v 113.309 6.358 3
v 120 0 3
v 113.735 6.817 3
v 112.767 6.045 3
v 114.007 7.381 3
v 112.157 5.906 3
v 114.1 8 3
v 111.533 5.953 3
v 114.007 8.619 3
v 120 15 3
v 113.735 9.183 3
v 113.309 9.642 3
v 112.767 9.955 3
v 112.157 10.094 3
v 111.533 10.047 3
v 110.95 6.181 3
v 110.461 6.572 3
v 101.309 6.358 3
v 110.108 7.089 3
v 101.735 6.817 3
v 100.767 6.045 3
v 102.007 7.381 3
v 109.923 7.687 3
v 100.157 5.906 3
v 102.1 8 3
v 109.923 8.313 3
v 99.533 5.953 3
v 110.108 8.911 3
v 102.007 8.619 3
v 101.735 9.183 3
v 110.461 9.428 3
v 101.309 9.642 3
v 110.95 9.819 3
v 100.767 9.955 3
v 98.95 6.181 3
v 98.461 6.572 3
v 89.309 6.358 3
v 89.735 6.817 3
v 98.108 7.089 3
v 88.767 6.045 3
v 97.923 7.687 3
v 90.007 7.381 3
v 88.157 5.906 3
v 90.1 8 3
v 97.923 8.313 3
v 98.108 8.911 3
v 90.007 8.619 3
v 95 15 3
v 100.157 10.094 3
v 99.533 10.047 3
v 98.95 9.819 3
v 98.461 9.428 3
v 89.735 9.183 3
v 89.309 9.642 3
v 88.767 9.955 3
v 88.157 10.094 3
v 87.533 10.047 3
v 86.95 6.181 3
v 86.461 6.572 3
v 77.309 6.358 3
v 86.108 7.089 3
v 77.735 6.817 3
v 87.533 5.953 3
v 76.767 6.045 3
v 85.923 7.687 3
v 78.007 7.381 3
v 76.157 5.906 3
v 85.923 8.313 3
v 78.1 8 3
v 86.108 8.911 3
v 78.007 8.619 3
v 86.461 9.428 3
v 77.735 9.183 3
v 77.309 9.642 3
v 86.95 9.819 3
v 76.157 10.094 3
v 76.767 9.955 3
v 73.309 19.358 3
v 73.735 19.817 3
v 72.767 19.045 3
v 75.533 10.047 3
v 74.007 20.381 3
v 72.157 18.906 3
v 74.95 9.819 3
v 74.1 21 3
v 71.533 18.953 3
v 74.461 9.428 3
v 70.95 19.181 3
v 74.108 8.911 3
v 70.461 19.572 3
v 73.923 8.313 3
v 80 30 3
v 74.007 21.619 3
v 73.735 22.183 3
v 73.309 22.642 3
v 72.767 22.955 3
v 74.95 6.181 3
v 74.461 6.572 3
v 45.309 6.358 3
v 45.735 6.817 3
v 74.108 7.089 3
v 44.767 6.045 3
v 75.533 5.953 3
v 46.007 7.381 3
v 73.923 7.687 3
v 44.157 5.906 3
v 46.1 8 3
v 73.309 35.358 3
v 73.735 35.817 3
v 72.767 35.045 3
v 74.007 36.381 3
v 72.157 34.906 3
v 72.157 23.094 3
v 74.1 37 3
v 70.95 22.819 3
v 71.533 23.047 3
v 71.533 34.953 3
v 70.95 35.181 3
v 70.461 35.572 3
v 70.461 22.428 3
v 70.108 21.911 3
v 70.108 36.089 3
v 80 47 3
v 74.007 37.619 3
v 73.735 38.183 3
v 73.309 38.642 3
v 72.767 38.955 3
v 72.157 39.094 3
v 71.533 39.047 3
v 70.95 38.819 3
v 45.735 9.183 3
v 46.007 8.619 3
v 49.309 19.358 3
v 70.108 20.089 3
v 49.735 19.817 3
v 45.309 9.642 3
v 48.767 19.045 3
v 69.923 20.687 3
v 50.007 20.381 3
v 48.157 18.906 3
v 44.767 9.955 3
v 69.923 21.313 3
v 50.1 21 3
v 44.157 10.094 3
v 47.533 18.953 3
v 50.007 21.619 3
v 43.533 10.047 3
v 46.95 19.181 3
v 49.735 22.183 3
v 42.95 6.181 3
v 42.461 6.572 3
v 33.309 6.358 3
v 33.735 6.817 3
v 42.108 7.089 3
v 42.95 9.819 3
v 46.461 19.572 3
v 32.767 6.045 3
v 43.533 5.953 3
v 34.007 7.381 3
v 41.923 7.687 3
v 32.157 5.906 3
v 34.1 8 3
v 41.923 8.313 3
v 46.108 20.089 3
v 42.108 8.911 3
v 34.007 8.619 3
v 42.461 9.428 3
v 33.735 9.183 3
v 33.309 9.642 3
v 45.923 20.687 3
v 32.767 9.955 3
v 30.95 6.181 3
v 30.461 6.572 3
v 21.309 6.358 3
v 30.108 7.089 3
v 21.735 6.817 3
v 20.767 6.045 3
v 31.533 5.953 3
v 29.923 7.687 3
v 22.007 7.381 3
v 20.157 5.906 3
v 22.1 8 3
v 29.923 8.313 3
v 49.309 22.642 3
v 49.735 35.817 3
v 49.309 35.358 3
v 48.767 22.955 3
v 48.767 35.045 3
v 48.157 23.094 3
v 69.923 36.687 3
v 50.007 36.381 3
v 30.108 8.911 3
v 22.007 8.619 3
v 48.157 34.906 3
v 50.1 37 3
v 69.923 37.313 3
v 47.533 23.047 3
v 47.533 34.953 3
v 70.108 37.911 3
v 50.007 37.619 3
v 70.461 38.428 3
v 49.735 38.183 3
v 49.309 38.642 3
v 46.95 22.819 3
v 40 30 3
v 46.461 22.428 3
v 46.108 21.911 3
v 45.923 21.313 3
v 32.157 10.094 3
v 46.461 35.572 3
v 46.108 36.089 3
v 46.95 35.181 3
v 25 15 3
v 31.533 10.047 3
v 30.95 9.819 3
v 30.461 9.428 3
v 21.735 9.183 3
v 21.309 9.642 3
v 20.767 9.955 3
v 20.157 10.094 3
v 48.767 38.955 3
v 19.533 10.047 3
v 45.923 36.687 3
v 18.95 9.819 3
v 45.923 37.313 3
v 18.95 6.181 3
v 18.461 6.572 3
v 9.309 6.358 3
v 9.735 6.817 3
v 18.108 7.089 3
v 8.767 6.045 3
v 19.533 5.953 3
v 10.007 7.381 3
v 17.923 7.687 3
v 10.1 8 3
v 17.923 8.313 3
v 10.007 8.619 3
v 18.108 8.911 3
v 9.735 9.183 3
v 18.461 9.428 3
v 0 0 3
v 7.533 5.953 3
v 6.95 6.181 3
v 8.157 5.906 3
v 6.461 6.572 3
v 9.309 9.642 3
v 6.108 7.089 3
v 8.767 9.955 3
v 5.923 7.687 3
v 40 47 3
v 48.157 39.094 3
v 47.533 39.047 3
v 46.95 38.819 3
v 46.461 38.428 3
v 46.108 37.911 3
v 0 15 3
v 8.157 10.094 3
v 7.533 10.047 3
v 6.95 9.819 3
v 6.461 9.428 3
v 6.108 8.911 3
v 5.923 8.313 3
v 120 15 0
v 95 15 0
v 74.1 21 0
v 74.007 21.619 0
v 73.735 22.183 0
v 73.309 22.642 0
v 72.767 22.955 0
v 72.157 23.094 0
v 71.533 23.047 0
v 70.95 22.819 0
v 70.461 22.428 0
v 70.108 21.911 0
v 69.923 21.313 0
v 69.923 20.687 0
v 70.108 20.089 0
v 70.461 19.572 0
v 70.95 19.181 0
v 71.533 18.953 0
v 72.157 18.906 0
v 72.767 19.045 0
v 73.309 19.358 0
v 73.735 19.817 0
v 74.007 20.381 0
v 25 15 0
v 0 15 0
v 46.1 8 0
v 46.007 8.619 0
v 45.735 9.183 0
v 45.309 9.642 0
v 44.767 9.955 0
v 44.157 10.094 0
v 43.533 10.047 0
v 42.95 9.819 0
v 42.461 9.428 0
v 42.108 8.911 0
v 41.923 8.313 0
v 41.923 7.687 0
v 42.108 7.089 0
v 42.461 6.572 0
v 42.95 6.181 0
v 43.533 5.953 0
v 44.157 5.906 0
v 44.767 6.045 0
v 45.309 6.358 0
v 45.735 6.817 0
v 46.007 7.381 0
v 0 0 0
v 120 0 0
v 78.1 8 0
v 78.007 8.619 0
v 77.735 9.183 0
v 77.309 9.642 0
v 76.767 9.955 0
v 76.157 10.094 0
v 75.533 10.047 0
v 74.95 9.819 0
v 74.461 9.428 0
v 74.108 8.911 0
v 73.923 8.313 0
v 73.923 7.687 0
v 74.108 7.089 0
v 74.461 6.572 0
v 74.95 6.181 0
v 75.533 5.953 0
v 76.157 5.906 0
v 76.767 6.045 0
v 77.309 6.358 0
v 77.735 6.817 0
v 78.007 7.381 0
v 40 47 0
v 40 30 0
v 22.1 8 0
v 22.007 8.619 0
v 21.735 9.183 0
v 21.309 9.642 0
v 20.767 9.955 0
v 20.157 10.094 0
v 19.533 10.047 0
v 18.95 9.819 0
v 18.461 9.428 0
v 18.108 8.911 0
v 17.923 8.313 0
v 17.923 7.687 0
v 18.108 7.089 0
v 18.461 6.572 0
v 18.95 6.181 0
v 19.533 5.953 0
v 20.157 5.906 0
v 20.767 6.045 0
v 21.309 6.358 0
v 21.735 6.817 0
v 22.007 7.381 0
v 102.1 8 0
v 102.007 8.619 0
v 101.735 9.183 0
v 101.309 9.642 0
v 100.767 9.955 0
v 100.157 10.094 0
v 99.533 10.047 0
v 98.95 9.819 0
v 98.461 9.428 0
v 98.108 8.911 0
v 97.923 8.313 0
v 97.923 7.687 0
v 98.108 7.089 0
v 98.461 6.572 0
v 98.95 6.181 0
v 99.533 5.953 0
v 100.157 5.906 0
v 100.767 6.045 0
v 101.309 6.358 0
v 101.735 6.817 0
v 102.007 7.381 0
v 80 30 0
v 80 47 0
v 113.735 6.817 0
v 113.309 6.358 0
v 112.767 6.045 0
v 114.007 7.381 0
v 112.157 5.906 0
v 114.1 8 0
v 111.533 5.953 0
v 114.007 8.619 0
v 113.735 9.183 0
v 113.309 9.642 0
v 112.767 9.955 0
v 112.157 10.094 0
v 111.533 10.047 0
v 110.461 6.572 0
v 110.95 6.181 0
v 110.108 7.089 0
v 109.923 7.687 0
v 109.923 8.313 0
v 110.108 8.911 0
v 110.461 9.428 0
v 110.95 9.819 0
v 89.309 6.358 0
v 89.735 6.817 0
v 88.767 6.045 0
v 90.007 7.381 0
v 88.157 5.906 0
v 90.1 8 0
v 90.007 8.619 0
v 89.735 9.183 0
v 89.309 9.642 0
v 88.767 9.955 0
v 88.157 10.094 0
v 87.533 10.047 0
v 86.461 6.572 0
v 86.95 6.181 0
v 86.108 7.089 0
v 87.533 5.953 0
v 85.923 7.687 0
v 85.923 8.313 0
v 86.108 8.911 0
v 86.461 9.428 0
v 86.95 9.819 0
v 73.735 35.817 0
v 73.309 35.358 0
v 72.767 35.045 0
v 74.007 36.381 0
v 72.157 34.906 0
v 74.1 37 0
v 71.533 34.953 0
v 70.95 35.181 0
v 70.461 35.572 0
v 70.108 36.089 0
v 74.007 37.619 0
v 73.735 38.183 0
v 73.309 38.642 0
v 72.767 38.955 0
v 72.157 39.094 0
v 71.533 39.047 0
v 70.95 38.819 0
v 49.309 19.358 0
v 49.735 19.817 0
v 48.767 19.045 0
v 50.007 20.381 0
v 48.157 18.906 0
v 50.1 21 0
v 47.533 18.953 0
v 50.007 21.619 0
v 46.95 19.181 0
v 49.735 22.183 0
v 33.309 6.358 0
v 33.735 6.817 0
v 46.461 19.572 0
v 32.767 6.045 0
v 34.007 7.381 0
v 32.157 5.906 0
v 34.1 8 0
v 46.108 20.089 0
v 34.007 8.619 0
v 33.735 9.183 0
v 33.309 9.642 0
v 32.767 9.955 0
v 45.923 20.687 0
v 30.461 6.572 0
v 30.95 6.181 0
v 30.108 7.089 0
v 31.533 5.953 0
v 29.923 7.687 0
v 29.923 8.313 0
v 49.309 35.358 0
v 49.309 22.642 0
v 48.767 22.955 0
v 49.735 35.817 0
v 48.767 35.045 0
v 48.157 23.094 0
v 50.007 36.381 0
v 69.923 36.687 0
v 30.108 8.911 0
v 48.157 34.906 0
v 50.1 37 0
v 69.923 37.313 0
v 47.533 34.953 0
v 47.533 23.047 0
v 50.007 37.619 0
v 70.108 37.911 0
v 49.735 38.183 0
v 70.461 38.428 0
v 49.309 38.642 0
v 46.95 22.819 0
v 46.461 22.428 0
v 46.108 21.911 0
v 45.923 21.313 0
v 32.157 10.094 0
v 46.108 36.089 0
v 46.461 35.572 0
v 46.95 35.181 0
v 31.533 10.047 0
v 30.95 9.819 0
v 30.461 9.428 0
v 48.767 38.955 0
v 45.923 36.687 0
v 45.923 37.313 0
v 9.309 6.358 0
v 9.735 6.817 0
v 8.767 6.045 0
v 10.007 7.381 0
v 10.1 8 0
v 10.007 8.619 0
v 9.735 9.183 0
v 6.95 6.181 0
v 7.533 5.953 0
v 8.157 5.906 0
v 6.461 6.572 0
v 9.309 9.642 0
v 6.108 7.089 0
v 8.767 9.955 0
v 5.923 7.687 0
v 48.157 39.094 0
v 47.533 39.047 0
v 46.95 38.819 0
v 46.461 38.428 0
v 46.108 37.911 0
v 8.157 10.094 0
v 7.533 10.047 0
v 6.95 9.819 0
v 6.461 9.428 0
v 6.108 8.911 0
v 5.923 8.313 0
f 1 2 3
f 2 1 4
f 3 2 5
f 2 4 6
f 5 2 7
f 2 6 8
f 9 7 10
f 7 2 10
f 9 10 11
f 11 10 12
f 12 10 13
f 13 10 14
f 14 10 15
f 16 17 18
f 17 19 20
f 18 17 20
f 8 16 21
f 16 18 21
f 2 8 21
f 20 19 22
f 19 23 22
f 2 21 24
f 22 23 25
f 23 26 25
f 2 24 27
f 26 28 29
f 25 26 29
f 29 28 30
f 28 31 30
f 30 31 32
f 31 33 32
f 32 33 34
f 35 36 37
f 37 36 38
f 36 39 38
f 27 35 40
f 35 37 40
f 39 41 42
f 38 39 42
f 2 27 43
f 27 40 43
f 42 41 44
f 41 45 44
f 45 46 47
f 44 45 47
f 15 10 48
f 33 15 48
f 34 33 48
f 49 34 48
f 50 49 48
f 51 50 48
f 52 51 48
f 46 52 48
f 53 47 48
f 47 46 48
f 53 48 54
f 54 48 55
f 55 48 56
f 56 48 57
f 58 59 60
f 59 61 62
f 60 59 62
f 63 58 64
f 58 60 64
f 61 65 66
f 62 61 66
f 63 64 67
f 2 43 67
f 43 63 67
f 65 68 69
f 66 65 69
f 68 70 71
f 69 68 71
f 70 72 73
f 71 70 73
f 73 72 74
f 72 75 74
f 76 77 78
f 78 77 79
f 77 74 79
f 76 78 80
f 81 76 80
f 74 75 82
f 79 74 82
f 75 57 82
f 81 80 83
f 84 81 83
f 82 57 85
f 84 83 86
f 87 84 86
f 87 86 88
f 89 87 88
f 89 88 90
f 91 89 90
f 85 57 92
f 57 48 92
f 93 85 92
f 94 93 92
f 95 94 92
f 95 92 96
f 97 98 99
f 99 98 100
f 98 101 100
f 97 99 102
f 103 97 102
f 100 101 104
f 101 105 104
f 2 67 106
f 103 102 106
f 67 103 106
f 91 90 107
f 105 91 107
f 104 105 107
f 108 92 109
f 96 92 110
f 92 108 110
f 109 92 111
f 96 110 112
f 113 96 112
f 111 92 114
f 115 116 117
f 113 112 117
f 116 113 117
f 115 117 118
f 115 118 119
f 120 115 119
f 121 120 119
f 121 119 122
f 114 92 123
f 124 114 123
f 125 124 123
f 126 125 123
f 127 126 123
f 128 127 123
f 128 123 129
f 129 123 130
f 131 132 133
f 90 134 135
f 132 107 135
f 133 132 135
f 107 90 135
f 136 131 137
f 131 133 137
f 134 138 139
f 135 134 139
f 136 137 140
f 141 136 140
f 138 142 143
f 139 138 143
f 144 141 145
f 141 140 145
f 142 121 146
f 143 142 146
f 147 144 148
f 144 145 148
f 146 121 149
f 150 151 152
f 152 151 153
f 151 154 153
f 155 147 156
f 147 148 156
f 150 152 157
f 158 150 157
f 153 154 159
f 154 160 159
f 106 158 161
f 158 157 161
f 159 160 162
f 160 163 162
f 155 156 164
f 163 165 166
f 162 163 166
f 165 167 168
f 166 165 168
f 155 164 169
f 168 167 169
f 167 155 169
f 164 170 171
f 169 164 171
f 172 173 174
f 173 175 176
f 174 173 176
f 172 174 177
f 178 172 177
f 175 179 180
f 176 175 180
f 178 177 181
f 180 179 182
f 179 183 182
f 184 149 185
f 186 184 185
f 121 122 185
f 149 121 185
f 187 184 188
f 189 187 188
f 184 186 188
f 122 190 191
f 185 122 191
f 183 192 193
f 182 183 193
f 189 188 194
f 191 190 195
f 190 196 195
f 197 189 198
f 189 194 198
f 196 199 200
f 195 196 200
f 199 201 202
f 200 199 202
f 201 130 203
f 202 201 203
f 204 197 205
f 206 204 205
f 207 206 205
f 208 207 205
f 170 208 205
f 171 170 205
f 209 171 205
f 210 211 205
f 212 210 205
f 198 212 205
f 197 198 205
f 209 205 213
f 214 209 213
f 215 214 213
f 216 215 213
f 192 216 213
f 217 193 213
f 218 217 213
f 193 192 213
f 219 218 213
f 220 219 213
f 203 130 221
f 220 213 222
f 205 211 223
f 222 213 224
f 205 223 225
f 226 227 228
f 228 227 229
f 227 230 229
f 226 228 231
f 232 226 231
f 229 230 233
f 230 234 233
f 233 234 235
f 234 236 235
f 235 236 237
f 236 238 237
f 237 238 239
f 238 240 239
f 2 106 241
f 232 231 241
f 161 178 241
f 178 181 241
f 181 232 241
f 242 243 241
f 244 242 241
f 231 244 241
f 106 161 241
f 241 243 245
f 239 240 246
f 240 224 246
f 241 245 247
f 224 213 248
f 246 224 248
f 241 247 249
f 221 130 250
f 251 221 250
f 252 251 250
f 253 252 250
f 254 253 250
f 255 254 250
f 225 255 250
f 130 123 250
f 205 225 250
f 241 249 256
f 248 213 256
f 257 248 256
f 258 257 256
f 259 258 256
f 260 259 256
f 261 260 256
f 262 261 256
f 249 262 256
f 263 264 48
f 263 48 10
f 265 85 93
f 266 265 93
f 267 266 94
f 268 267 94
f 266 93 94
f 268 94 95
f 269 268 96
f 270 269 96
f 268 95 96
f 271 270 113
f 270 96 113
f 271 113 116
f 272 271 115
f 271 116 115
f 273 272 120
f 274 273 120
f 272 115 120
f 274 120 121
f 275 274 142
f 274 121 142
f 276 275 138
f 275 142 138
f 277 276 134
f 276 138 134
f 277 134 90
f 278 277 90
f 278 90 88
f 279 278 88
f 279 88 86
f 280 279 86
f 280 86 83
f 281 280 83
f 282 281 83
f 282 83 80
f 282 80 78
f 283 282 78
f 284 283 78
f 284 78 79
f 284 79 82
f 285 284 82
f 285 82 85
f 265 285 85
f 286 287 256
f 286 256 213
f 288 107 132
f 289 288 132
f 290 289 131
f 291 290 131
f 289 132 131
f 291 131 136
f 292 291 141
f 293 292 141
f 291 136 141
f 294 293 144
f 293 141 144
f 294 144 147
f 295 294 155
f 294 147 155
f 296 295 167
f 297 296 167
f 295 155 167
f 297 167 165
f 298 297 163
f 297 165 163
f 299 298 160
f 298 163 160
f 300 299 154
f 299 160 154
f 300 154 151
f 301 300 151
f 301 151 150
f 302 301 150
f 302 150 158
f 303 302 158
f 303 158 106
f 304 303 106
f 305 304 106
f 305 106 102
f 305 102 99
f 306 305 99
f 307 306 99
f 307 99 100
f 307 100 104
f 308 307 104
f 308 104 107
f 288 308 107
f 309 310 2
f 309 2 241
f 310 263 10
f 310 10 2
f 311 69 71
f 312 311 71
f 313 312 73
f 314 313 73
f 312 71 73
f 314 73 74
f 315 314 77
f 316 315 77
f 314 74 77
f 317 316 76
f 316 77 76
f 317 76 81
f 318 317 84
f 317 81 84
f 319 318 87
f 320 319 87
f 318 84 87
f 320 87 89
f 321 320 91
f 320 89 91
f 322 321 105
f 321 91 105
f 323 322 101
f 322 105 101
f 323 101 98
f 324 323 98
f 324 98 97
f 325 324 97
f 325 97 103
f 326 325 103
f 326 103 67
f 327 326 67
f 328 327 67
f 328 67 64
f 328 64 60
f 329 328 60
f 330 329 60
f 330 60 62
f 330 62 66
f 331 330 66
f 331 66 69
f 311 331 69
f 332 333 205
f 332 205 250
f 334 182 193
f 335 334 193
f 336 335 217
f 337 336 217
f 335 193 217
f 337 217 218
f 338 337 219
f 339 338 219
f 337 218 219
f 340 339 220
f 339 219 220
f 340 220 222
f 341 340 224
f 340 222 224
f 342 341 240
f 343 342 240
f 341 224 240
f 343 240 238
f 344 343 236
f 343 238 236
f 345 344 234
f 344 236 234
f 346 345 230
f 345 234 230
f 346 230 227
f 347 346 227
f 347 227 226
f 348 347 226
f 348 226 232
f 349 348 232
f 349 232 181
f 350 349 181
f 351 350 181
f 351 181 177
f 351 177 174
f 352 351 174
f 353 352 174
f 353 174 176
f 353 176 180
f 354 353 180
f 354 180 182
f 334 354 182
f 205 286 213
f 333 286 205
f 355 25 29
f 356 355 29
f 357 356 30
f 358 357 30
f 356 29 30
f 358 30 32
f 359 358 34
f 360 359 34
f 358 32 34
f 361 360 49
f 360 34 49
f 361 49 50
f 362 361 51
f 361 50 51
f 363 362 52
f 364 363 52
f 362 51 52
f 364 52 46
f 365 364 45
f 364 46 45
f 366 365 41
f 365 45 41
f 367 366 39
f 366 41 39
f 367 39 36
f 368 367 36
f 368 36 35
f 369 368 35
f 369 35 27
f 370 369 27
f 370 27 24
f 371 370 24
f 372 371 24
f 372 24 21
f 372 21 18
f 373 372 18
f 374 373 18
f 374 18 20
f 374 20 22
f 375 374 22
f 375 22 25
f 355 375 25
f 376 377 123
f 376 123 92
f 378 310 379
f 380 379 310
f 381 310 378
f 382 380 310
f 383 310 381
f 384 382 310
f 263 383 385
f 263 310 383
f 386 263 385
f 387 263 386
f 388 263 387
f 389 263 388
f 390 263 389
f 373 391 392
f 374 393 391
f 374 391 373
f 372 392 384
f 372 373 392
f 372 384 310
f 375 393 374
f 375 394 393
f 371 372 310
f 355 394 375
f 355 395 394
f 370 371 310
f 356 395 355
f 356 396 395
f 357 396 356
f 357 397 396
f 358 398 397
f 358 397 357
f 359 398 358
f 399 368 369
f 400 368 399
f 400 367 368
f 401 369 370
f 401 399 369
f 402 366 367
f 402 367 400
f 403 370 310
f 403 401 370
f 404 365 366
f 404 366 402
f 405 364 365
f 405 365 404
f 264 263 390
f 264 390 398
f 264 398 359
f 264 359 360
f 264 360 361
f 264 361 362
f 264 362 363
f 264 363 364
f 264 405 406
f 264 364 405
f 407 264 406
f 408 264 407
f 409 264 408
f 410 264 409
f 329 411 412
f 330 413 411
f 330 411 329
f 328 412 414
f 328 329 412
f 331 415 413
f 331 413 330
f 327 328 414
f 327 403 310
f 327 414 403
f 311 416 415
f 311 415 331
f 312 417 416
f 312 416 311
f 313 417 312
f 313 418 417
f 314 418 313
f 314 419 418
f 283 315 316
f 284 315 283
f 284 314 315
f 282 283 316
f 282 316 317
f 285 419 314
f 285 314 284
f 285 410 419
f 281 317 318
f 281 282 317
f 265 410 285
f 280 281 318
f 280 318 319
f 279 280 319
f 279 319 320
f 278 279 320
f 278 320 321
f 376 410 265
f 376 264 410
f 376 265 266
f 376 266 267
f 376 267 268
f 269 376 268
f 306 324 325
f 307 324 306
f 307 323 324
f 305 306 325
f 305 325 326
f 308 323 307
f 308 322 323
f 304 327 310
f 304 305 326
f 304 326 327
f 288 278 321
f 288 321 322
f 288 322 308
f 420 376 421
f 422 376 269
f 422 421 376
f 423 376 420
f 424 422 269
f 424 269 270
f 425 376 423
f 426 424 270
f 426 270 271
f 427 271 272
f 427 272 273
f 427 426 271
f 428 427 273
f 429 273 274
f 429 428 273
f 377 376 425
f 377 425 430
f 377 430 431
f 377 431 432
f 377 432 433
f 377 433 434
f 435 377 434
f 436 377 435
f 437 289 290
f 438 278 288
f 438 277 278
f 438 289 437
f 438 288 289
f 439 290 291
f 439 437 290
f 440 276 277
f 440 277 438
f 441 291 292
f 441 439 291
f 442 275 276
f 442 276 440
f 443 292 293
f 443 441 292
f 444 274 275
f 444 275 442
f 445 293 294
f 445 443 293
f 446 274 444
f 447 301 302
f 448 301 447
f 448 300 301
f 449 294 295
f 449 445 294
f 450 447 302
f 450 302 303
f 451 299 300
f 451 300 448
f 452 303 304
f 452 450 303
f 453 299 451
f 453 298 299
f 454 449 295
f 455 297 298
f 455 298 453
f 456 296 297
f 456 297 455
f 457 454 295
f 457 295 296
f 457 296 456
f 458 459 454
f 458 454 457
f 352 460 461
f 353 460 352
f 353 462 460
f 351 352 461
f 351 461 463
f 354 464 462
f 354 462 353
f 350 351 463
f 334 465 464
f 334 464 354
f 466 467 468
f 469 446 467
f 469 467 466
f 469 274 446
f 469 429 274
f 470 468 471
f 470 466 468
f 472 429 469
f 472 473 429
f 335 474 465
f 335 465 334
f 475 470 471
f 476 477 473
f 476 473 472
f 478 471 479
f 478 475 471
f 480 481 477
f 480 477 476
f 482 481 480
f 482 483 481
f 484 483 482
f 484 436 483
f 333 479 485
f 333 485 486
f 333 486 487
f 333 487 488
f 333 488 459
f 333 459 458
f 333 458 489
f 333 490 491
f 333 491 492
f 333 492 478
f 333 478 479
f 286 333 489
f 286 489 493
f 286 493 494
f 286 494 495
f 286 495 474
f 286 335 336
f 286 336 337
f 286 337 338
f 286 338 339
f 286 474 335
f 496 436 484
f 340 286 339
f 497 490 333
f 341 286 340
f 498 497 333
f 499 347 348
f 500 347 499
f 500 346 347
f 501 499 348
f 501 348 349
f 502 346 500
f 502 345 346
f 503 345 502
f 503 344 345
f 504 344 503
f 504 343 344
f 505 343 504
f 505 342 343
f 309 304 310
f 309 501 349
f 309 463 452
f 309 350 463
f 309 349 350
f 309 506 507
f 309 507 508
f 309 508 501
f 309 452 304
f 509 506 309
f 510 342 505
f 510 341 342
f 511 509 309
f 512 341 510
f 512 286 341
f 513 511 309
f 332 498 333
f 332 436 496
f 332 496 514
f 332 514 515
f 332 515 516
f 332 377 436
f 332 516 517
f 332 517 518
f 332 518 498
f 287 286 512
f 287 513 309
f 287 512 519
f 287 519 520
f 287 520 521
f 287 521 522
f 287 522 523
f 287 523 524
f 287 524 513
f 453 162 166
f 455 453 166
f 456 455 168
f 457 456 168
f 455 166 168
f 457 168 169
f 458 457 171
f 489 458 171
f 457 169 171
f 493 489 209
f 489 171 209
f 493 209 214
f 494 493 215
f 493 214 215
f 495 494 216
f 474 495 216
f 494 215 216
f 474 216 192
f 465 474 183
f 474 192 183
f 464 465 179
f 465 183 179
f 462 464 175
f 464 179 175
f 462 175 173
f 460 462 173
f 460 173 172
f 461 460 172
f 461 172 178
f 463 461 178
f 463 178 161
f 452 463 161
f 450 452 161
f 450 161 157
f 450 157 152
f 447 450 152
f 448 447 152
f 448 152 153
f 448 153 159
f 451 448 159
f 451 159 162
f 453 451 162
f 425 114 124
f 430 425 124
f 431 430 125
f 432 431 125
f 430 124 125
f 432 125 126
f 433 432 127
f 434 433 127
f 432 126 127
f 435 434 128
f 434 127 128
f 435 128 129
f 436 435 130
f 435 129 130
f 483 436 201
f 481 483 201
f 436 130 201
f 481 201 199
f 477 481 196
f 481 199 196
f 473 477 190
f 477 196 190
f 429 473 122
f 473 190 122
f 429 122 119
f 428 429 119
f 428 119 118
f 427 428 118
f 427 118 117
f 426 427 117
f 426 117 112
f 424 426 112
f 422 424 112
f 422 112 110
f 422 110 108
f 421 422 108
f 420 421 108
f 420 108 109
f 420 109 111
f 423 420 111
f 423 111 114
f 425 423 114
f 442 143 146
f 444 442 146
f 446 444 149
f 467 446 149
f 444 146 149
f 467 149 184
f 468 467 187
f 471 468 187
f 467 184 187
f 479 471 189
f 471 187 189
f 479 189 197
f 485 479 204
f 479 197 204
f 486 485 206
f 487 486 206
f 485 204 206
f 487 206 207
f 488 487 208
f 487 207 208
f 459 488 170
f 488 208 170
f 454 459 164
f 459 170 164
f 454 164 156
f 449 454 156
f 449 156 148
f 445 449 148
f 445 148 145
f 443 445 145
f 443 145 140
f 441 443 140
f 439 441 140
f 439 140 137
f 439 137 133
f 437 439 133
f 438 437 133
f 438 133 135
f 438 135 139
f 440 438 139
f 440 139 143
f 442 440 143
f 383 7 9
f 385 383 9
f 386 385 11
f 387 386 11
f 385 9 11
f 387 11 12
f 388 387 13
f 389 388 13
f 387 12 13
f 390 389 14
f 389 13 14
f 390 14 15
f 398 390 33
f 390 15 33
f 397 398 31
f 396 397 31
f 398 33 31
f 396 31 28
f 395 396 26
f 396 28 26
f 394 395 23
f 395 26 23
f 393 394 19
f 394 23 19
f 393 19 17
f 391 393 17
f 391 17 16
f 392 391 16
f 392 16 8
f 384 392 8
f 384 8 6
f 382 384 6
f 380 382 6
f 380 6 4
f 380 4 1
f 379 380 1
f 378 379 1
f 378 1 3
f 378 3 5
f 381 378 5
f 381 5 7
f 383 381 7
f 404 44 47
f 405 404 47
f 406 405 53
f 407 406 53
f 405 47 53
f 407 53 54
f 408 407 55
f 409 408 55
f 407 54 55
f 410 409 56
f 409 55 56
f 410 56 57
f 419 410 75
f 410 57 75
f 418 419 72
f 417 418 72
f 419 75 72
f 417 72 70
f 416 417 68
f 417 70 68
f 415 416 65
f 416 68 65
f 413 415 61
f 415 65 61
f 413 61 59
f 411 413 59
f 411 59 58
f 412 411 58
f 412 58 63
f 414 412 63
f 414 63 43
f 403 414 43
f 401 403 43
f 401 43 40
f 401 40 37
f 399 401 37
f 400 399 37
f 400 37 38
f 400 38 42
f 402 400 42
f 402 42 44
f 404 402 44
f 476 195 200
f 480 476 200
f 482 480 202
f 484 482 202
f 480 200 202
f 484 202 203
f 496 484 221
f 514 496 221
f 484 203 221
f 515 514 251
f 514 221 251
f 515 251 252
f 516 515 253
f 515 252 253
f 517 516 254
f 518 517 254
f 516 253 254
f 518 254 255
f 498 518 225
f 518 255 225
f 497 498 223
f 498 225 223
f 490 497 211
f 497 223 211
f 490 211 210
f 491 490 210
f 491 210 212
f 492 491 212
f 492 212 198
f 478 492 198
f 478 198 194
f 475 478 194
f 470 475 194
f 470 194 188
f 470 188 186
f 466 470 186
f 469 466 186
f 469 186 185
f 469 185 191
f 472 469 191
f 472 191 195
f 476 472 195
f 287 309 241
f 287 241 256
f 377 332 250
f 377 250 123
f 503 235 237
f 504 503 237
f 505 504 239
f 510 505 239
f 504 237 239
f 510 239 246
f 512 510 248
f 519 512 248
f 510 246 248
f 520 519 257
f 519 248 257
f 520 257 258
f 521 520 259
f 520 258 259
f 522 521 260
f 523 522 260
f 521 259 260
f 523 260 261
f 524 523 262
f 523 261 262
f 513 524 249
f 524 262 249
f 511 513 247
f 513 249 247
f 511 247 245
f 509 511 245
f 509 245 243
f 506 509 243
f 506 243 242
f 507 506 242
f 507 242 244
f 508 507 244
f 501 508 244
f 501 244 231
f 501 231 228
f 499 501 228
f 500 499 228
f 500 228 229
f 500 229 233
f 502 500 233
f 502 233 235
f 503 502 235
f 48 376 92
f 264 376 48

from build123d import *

# Parameters (mm, degrees)
EXTRUDE_1_DEPTH     = 3
SKETCH_2_R          = 2.1
CUT_EXTRUDE_1_DEPTH = 129.910821889


with BuildPart() as part:
    # 草图1 → 凸台-拉伸1 (new body)
    with BuildSketch(Plane.XY):
        Polygon((0, 0), (0, 15), (25, 15), (40, 30), (40, 47), (80, 47), (80, 30), (95, 15), (120, 15), (120, 0), align=None)
    extrude(amount=EXTRUDE_1_DEPTH)

    # 草图2 → 切除-拉伸1 (cut, through all)
    with BuildSketch(Plane.XY.offset(3)):
        with Locations((48, 37)):
            Circle(SKETCH_2_R)
        with Locations((72, 37)):
            Circle(SKETCH_2_R)
        with Locations((48, 21)):
            Circle(SKETCH_2_R)
        with Locations((72, 21)):
            Circle(SKETCH_2_R)
        with Locations((112, 8)):
            Circle(SKETCH_2_R)
        with Locations((76, 8)):
            Circle(SKETCH_2_R)
        with Locations((88, 8)):
            Circle(SKETCH_2_R)
        with Locations((8, 8)):
            Circle(SKETCH_2_R)
        with Locations((20, 8)):
            Circle(SKETCH_2_R)
        with Locations((100, 8)):
            Circle(SKETCH_2_R)
        with Locations((32, 8)):
            Circle(SKETCH_2_R)
        with Locations((44, 8)):
            Circle(SKETCH_2_R)
        with Locations((432, 8)):
            Circle(SKETCH_2_R)
        with Locations((444, 8)):
            Circle(SKETCH_2_R)
        with Locations((524, 8)):
            Circle(SKETCH_2_R)
        with Locations((536, 8)):
            Circle(SKETCH_2_R)
        with Locations((456, 8)):
            Circle(SKETCH_2_R)
        with Locations((468, 8)):
            Circle(SKETCH_2_R)
        with Locations((500, 8)):
            Circle(SKETCH_2_R)
        with Locations((512, 8)):
            Circle(SKETCH_2_R)
    extrude(amount=-CUT_EXTRUDE_1_DEPTH, mode=Mode.SUBTRACT)


solid = part.part
